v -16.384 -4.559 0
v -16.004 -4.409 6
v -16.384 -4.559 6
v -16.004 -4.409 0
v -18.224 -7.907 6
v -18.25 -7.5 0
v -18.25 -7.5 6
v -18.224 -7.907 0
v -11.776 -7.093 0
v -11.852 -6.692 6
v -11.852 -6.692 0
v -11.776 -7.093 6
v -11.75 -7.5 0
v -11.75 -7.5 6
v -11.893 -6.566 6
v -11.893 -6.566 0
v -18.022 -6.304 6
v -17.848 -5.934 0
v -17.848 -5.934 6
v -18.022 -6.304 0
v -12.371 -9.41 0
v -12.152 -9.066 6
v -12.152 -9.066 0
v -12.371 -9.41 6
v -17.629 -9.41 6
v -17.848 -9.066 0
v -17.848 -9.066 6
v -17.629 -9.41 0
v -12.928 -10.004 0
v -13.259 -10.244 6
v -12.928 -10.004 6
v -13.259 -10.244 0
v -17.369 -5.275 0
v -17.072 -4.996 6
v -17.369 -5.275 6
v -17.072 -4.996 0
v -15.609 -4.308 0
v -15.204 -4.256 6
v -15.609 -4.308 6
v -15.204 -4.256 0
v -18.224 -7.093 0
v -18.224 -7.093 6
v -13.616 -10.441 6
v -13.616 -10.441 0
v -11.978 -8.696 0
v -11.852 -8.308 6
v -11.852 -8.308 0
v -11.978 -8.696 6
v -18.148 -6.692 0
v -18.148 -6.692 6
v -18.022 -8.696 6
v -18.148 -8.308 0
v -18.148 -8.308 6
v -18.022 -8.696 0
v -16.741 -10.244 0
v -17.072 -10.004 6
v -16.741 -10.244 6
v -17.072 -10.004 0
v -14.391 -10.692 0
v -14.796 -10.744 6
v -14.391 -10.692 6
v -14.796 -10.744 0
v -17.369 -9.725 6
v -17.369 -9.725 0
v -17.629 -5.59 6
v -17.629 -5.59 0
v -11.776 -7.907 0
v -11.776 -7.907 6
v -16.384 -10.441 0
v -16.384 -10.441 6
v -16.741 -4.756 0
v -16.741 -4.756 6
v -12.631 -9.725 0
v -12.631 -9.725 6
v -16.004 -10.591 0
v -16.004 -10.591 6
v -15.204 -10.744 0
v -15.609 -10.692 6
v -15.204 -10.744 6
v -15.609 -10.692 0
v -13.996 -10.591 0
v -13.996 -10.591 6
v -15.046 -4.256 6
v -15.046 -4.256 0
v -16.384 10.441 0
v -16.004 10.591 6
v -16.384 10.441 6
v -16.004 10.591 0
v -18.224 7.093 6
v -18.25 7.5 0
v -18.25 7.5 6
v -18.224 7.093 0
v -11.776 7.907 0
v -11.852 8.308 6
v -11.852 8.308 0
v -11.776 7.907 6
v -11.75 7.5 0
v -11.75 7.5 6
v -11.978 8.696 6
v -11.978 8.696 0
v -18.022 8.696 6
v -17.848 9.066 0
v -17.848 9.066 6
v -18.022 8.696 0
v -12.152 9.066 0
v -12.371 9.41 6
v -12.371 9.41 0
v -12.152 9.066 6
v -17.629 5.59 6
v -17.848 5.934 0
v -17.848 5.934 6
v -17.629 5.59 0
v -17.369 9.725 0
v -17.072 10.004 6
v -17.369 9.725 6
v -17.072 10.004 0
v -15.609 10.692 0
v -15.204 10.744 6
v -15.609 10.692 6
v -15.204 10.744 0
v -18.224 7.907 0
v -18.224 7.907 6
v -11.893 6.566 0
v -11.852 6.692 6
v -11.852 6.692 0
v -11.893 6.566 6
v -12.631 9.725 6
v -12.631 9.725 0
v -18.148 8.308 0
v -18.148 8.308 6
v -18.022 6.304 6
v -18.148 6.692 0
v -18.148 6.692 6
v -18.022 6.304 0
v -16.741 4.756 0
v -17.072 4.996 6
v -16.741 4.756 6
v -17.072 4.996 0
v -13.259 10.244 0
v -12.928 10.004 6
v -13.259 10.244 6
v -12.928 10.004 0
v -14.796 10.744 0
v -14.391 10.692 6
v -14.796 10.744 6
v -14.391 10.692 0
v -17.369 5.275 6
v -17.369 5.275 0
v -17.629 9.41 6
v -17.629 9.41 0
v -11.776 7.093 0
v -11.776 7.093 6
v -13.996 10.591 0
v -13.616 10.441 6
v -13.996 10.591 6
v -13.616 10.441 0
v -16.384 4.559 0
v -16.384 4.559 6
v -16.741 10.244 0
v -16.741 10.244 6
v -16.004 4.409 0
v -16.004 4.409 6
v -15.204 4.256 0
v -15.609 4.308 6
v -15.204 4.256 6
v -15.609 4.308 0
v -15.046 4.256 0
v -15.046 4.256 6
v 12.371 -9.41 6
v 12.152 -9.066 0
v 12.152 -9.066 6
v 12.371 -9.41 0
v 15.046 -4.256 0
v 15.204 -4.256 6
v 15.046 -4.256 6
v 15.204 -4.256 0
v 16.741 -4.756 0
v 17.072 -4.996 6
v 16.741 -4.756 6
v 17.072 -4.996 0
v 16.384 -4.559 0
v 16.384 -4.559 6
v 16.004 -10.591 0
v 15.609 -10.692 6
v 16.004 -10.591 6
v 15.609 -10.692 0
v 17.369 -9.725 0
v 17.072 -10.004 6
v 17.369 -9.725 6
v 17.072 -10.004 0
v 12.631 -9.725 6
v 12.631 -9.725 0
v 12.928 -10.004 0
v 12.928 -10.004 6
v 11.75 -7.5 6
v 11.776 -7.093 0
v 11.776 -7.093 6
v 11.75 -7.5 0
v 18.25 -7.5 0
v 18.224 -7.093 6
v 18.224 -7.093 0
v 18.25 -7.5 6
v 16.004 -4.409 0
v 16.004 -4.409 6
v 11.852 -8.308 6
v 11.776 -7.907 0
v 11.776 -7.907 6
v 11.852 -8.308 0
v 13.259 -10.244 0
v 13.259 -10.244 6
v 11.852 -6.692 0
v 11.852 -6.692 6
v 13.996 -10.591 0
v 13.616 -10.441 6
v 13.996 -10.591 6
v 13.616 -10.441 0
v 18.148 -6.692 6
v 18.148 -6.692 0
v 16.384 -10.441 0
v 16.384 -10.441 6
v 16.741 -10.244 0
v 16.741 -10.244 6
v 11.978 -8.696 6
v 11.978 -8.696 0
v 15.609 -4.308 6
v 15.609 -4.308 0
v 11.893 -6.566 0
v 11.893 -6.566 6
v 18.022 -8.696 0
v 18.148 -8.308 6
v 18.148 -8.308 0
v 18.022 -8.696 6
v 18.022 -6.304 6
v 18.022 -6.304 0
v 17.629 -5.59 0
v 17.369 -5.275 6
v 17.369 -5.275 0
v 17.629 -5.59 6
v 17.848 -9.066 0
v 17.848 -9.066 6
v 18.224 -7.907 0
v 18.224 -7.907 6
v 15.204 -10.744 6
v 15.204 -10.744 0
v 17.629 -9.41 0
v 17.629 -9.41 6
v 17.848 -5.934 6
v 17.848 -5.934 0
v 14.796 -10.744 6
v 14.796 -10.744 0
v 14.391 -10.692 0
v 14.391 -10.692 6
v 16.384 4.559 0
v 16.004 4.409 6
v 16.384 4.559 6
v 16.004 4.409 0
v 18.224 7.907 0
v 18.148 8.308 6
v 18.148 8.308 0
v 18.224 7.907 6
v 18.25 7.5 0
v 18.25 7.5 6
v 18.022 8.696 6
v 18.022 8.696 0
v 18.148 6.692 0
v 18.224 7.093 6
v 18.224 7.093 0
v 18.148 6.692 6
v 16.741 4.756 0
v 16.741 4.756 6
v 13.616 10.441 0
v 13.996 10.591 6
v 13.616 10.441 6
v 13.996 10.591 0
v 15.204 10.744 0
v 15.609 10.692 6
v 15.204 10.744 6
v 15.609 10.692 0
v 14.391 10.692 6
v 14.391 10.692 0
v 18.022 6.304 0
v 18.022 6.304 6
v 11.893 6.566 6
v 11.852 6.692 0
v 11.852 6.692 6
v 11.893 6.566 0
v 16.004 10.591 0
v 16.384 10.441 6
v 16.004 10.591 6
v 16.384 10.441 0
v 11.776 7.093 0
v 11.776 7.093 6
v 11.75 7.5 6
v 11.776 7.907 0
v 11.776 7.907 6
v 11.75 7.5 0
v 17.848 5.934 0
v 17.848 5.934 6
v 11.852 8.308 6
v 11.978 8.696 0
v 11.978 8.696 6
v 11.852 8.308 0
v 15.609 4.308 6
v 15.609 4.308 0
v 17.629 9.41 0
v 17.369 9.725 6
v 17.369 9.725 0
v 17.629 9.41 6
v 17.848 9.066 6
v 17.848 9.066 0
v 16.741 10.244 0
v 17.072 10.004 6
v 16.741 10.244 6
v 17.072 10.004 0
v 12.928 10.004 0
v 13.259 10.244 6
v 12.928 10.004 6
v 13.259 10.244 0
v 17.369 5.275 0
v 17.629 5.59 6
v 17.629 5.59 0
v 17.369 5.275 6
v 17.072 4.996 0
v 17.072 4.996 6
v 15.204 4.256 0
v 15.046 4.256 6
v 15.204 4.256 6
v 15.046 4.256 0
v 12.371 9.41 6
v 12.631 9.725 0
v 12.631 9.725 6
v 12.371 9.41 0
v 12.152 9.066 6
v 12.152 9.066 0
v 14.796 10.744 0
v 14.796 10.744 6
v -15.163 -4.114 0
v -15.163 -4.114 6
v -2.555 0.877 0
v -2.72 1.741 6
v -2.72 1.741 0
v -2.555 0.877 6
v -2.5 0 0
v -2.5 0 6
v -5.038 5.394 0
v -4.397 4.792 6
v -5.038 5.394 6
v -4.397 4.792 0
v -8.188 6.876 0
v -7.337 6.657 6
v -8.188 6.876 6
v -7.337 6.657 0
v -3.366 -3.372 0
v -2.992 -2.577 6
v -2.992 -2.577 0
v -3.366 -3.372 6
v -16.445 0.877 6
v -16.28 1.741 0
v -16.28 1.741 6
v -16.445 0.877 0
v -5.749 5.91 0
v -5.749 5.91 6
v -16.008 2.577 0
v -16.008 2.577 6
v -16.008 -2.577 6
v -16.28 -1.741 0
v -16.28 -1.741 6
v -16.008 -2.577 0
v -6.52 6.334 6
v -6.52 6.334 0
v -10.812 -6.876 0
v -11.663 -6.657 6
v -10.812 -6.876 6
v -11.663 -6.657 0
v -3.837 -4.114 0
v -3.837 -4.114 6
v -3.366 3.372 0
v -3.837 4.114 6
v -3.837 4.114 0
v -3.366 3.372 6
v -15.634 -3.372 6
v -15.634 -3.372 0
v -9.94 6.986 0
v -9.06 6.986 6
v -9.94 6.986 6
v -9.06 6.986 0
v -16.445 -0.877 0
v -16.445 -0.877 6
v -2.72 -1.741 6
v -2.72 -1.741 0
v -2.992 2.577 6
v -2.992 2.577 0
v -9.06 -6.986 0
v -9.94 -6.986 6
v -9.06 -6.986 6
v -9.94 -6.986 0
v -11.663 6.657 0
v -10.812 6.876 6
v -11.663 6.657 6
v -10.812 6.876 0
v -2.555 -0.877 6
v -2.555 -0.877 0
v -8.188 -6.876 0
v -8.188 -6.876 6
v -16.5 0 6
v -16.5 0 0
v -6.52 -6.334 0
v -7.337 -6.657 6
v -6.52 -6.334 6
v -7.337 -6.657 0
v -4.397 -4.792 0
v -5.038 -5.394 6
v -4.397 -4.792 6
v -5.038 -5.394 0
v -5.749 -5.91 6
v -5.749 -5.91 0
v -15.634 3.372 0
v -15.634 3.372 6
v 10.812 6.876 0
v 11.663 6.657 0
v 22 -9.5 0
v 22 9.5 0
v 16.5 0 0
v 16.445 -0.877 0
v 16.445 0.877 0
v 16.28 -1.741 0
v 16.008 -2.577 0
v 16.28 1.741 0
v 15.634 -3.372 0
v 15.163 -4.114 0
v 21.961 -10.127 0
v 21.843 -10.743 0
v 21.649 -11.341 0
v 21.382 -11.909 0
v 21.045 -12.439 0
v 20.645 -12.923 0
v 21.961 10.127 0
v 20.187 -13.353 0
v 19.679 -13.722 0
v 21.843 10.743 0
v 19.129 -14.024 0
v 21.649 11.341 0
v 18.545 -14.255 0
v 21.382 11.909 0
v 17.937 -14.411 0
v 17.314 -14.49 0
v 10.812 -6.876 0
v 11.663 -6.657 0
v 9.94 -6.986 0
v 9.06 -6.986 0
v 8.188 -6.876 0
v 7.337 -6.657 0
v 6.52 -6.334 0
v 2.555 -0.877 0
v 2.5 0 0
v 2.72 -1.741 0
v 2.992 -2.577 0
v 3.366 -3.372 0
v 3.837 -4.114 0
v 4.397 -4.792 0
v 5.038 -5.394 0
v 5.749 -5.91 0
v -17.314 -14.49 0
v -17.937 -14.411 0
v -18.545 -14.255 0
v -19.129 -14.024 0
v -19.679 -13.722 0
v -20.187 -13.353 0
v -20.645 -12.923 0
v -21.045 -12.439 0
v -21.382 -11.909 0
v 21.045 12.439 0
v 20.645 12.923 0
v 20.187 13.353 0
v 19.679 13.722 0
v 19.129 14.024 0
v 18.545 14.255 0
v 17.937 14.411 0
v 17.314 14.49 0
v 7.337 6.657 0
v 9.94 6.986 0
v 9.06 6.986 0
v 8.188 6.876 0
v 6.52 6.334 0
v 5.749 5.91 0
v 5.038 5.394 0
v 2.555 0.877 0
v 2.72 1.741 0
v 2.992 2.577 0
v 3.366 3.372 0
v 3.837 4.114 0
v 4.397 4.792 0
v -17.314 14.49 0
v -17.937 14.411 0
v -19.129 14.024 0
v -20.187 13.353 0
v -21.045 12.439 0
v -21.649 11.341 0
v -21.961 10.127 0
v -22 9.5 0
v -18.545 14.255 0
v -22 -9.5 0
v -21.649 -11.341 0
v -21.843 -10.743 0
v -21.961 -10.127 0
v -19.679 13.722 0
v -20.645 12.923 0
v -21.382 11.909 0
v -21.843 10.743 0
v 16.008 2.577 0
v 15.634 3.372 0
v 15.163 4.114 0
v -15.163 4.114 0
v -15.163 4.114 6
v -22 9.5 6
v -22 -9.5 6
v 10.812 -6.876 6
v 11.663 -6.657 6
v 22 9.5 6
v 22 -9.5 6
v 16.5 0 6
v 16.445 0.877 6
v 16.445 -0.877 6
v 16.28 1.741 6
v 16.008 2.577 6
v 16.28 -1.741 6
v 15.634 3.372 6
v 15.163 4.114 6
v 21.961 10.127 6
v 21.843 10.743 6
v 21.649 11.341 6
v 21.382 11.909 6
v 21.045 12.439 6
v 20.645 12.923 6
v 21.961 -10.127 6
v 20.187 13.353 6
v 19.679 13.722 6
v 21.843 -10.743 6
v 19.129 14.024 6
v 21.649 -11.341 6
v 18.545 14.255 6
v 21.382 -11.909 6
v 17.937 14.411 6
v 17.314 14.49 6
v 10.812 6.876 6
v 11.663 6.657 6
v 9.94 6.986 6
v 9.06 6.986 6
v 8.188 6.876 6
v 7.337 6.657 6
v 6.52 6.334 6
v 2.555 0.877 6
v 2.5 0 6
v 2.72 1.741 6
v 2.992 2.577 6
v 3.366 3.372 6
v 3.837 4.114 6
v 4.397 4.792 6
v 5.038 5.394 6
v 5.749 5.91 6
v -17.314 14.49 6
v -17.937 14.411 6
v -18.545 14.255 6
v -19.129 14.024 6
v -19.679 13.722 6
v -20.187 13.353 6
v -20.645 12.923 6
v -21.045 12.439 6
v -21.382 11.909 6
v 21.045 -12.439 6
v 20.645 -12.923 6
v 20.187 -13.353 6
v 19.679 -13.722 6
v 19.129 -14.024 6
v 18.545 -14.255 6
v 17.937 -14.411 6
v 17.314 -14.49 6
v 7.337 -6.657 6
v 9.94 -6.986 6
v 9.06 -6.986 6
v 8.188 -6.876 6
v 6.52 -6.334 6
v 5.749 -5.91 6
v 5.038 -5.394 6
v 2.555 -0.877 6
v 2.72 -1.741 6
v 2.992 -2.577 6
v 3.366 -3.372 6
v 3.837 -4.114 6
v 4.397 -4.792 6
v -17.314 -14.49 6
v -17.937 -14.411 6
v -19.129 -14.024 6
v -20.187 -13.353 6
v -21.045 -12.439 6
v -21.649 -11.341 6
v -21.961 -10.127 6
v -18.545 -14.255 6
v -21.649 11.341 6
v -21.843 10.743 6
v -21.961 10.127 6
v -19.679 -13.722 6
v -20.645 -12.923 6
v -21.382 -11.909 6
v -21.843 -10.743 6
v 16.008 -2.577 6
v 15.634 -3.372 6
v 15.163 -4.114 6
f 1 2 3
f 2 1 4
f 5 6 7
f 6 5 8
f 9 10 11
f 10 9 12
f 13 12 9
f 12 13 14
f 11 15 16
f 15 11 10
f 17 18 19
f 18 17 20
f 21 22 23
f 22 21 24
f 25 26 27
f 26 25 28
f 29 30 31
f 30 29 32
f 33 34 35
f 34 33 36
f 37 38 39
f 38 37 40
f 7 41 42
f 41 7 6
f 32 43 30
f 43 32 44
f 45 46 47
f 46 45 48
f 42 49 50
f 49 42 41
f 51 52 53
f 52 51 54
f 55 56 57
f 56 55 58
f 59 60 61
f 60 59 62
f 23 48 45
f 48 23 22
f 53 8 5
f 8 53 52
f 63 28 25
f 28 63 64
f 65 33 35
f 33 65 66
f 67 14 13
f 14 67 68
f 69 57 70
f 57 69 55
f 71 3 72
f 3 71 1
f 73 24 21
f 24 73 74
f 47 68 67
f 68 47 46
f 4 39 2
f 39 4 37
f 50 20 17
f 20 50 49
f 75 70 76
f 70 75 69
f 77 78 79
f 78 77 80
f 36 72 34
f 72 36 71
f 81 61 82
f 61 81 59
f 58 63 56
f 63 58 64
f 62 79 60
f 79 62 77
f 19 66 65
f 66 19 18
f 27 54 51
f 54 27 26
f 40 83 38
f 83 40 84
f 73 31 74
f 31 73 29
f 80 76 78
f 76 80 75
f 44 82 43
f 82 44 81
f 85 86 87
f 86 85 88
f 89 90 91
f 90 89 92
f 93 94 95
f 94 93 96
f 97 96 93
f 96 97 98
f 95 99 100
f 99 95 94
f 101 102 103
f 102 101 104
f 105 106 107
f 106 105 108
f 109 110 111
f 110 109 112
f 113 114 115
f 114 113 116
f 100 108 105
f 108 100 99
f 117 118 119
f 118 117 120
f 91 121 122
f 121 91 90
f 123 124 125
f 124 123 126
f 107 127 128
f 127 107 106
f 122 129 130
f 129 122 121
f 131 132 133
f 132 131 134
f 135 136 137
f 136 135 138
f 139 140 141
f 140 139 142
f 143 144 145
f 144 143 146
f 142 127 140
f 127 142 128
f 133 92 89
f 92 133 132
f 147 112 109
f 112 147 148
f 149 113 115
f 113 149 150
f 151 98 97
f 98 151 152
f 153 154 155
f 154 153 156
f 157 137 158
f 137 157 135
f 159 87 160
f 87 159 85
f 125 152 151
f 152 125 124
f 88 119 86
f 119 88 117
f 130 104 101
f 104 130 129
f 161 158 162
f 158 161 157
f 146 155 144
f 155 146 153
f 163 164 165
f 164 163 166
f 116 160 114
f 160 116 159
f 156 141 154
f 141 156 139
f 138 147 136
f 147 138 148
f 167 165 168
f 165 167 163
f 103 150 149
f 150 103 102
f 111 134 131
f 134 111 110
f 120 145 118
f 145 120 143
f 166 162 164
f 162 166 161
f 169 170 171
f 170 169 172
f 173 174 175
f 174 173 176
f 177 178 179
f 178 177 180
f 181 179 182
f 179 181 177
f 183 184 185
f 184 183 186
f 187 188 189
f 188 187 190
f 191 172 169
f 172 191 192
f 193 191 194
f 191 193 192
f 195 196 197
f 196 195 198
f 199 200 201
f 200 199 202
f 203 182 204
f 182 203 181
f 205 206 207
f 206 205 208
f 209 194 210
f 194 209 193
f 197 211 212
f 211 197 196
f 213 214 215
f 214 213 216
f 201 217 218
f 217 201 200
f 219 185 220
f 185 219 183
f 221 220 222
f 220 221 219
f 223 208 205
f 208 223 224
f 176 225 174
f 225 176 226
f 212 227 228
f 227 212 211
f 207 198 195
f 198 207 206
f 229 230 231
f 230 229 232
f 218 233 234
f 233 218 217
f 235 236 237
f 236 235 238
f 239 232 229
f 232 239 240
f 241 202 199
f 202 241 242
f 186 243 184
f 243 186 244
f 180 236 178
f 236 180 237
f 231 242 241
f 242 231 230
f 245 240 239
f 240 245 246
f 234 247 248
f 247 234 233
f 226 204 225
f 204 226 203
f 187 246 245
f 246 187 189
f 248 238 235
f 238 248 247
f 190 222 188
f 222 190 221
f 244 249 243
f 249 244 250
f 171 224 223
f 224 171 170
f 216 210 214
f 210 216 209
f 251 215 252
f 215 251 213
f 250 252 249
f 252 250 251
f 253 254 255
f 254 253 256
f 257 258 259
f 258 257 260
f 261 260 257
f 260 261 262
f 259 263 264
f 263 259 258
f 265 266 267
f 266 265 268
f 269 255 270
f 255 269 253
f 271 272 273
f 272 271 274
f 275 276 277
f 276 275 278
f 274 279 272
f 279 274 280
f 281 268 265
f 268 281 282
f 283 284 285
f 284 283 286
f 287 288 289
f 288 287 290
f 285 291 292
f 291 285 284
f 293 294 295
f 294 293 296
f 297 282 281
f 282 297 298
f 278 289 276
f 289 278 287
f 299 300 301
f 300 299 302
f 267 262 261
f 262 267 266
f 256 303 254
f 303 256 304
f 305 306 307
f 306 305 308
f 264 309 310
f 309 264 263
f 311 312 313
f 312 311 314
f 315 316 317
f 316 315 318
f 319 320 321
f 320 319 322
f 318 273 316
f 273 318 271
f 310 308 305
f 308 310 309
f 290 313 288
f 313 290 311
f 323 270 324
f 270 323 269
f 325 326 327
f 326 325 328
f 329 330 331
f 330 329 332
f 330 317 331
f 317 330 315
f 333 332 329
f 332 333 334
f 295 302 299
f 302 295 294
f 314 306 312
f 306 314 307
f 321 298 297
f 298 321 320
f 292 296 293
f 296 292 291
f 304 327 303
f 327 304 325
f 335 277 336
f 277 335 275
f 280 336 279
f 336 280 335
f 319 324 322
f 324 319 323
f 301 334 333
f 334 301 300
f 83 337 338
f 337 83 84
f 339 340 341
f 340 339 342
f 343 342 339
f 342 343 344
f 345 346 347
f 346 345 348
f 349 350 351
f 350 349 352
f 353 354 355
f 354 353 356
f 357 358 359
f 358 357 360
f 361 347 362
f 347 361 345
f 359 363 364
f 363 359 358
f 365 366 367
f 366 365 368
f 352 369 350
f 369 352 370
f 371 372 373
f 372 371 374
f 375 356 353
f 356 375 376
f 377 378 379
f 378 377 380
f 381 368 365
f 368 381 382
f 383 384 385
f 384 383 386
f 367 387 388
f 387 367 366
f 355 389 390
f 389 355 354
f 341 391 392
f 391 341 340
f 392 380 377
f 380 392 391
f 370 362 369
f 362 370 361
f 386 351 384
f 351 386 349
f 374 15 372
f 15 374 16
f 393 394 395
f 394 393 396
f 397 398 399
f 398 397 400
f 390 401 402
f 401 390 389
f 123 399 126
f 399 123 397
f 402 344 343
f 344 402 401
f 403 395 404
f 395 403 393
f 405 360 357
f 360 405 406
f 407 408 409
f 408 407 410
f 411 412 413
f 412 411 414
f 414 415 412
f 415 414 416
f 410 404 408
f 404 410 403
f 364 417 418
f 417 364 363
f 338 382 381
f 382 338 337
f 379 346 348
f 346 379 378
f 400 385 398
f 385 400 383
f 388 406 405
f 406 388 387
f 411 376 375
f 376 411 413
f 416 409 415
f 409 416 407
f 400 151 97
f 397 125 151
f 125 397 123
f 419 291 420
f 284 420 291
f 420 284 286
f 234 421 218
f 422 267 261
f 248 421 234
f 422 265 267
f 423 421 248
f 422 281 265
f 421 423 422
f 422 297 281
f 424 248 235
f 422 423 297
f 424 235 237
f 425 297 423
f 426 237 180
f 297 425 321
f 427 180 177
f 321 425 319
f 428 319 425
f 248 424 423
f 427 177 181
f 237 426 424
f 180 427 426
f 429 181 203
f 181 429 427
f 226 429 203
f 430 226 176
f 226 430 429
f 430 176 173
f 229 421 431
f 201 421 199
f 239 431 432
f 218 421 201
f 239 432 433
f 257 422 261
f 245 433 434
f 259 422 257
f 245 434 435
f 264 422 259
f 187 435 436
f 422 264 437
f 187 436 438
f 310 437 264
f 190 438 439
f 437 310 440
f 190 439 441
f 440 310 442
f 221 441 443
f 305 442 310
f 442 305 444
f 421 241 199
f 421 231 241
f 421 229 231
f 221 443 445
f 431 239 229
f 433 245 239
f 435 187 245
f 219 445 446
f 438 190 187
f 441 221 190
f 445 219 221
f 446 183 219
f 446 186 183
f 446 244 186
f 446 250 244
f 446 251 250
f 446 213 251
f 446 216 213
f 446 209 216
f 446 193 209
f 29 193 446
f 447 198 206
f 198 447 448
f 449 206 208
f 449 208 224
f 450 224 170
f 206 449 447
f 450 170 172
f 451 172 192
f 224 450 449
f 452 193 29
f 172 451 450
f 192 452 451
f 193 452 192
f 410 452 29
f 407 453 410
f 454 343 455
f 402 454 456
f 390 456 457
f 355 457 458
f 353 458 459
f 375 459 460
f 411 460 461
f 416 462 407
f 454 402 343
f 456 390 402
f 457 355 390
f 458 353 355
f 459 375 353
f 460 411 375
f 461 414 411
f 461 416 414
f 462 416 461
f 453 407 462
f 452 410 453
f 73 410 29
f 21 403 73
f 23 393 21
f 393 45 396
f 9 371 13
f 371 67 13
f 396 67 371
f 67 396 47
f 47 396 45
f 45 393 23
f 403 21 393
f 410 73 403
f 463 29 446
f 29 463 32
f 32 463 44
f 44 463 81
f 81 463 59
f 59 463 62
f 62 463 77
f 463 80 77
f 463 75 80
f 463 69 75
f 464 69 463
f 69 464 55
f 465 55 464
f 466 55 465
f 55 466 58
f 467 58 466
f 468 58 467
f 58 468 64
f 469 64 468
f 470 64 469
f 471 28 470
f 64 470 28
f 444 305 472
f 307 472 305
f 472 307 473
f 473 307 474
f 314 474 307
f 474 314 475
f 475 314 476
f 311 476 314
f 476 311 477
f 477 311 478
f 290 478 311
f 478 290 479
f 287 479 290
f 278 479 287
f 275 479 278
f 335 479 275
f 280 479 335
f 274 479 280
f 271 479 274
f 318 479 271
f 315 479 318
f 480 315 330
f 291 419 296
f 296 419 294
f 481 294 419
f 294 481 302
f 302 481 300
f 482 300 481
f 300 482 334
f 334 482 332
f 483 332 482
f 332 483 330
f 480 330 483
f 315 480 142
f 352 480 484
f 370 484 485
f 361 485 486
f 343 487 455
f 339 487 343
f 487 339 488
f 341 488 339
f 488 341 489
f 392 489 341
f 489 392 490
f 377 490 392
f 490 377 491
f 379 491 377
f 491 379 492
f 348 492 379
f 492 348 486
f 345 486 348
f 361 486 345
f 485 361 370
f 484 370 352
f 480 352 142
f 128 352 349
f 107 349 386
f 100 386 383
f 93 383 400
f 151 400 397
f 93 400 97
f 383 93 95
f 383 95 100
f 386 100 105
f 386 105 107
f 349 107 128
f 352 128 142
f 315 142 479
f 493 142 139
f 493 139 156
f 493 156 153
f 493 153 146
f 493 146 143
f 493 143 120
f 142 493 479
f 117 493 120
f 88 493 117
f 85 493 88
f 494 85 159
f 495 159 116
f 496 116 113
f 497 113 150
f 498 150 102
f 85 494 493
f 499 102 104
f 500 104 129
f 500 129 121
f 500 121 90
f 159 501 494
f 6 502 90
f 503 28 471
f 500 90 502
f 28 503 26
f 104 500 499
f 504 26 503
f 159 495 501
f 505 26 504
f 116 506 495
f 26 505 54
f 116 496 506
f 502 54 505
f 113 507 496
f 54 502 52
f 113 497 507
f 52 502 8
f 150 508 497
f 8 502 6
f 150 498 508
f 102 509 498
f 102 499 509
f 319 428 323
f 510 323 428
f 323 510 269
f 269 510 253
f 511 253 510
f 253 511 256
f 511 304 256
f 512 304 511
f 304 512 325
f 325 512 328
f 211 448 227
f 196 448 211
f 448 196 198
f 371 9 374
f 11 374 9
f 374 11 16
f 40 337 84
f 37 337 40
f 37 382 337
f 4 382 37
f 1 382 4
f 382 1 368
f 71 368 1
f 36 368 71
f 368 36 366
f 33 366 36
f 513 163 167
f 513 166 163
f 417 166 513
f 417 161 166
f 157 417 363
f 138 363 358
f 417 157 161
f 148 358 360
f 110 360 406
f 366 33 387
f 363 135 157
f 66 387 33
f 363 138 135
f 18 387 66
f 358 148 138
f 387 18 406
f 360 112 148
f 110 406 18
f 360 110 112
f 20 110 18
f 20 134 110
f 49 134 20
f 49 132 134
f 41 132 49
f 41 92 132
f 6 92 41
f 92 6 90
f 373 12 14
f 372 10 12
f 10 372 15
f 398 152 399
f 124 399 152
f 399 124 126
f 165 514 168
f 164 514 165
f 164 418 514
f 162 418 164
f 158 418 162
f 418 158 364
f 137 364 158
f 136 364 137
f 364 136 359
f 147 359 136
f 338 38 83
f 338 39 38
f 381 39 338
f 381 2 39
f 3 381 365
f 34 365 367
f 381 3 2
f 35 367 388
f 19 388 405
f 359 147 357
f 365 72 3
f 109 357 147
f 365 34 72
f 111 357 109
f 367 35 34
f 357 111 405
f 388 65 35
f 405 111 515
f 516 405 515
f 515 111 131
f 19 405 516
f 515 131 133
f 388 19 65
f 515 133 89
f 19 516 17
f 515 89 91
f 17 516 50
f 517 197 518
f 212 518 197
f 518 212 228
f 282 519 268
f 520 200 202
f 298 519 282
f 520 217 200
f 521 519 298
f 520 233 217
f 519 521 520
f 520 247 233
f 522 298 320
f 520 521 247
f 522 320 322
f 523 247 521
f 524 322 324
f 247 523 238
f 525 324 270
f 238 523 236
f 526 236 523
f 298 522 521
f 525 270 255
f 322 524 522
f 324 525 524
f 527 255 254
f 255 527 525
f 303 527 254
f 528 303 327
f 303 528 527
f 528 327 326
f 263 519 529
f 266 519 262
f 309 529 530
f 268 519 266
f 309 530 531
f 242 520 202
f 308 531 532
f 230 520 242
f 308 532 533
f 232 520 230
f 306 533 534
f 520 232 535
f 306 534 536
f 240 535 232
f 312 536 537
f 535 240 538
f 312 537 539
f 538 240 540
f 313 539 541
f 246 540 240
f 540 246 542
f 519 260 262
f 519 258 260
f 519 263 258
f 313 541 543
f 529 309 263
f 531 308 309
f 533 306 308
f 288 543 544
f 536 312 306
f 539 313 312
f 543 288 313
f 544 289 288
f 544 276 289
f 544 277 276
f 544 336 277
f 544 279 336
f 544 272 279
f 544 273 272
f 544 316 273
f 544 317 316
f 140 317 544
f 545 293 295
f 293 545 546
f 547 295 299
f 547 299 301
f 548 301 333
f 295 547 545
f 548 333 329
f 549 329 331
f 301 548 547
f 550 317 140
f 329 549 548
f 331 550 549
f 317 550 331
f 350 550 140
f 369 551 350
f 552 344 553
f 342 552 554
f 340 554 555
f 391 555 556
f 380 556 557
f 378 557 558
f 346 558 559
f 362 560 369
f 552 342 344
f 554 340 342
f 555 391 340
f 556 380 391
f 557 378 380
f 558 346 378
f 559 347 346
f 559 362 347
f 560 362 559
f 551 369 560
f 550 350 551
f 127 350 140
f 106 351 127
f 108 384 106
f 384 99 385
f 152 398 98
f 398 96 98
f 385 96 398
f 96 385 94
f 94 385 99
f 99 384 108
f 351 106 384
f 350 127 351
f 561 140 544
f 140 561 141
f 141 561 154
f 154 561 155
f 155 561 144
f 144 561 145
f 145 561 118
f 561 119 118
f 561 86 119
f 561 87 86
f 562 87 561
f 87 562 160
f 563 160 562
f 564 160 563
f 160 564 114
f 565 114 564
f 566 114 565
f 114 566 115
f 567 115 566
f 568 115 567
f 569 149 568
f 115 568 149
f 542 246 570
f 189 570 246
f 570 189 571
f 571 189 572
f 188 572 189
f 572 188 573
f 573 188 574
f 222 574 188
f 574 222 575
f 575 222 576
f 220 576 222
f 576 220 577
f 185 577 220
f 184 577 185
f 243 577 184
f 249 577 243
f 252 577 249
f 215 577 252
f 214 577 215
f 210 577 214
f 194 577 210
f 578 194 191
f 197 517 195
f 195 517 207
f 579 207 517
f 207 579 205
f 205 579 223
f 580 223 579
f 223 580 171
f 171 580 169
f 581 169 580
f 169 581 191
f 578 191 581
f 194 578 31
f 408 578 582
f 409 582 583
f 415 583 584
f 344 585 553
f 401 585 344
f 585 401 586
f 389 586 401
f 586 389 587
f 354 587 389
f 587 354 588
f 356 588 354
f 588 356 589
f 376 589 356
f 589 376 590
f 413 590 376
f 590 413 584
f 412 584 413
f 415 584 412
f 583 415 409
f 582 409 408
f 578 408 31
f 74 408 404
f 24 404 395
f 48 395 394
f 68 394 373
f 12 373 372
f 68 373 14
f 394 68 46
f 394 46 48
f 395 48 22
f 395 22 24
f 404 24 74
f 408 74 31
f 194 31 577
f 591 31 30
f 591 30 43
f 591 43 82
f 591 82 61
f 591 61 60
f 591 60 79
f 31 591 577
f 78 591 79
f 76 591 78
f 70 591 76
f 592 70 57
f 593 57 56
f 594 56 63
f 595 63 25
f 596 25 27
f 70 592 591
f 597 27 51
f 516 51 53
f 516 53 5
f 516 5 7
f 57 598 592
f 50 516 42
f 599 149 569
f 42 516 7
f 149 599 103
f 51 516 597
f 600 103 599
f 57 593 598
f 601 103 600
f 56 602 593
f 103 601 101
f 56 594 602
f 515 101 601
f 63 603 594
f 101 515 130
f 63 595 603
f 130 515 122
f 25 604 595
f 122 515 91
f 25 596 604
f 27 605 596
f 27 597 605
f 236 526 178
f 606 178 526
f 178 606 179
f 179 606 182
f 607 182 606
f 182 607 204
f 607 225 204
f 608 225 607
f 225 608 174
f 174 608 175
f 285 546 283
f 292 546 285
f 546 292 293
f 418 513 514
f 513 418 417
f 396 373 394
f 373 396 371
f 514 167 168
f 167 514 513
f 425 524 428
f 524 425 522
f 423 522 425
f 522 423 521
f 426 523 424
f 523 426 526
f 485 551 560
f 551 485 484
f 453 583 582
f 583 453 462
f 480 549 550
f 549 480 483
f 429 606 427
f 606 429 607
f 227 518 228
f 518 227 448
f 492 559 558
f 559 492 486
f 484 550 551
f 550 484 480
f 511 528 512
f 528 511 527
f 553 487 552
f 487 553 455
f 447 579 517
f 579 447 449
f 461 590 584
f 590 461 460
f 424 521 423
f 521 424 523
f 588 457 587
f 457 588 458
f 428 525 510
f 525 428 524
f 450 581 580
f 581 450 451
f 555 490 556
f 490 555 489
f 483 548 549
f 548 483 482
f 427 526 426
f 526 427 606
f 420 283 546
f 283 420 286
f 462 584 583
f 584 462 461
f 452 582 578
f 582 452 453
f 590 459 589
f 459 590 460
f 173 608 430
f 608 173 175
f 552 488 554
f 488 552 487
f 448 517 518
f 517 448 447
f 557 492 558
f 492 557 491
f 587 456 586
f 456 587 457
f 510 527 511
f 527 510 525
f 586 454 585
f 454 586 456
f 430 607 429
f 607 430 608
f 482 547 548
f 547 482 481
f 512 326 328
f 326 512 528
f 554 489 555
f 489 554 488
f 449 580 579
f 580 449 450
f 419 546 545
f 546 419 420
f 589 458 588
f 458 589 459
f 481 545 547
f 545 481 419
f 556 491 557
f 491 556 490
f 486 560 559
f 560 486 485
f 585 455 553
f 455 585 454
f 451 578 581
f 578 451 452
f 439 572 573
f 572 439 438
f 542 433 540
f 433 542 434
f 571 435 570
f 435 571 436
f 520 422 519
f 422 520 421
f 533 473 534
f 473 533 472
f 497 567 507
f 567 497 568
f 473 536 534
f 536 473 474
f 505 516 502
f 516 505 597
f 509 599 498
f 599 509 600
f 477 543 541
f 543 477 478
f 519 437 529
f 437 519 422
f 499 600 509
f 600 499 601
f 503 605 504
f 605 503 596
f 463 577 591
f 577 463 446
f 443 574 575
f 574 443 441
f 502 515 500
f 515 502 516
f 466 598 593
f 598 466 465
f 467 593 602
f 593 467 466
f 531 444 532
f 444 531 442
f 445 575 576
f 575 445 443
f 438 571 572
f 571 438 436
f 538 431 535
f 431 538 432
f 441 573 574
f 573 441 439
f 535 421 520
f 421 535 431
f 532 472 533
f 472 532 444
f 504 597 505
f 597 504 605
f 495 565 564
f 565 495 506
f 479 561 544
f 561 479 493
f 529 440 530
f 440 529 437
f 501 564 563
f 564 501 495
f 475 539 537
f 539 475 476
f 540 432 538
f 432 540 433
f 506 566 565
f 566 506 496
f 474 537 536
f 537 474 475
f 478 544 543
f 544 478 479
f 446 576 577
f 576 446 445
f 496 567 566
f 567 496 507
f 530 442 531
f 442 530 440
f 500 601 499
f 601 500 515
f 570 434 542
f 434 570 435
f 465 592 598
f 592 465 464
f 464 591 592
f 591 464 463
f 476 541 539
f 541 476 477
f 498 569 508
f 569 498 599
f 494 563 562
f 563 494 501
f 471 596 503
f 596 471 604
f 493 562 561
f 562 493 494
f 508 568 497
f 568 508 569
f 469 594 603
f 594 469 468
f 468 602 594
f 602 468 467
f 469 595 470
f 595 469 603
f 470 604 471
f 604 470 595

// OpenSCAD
$fn = 50;


difference() {
	union() {
		hull() {
			translate(v = [-17.0000000000, 9.5000000000, 0]) {
				cylinder(h = 6, r = 5);
			}
			translate(v = [17.0000000000, 9.5000000000, 0]) {
				cylinder(h = 6, r = 5);
			}
			translate(v = [-17.0000000000, -9.5000000000, 0]) {
				cylinder(h = 6, r = 5);
			}
			translate(v = [17.0000000000, -9.5000000000, 0]) {
				cylinder(h = 6, r = 5);
			}
		}
	}
	union() {
		#translate(v = [-15.0000000000, -7.5000000000, -100.0000000000]) {
			cylinder(h = 200, r = 3.2500000000);
		}
		#translate(v = [-15.0000000000, 7.5000000000, -100.0000000000]) {
			cylinder(h = 200, r = 3.2500000000);
		}
		#translate(v = [15.0000000000, -7.5000000000, -100.0000000000]) {
			cylinder(h = 200, r = 3.2500000000);
		}
		#translate(v = [15.0000000000, 7.5000000000, -100.0000000000]) {
			cylinder(h = 200, r = 3.2500000000);
		}
		#translate(v = [-9.5000000000, 0, 0]) {
			cylinder(h = 6, r = 7.0000000000);
		}
		#translate(v = [9.5000000000, 0, 0]) {
			cylinder(h = 6, r = 7.0000000000);
		}
	}
}
